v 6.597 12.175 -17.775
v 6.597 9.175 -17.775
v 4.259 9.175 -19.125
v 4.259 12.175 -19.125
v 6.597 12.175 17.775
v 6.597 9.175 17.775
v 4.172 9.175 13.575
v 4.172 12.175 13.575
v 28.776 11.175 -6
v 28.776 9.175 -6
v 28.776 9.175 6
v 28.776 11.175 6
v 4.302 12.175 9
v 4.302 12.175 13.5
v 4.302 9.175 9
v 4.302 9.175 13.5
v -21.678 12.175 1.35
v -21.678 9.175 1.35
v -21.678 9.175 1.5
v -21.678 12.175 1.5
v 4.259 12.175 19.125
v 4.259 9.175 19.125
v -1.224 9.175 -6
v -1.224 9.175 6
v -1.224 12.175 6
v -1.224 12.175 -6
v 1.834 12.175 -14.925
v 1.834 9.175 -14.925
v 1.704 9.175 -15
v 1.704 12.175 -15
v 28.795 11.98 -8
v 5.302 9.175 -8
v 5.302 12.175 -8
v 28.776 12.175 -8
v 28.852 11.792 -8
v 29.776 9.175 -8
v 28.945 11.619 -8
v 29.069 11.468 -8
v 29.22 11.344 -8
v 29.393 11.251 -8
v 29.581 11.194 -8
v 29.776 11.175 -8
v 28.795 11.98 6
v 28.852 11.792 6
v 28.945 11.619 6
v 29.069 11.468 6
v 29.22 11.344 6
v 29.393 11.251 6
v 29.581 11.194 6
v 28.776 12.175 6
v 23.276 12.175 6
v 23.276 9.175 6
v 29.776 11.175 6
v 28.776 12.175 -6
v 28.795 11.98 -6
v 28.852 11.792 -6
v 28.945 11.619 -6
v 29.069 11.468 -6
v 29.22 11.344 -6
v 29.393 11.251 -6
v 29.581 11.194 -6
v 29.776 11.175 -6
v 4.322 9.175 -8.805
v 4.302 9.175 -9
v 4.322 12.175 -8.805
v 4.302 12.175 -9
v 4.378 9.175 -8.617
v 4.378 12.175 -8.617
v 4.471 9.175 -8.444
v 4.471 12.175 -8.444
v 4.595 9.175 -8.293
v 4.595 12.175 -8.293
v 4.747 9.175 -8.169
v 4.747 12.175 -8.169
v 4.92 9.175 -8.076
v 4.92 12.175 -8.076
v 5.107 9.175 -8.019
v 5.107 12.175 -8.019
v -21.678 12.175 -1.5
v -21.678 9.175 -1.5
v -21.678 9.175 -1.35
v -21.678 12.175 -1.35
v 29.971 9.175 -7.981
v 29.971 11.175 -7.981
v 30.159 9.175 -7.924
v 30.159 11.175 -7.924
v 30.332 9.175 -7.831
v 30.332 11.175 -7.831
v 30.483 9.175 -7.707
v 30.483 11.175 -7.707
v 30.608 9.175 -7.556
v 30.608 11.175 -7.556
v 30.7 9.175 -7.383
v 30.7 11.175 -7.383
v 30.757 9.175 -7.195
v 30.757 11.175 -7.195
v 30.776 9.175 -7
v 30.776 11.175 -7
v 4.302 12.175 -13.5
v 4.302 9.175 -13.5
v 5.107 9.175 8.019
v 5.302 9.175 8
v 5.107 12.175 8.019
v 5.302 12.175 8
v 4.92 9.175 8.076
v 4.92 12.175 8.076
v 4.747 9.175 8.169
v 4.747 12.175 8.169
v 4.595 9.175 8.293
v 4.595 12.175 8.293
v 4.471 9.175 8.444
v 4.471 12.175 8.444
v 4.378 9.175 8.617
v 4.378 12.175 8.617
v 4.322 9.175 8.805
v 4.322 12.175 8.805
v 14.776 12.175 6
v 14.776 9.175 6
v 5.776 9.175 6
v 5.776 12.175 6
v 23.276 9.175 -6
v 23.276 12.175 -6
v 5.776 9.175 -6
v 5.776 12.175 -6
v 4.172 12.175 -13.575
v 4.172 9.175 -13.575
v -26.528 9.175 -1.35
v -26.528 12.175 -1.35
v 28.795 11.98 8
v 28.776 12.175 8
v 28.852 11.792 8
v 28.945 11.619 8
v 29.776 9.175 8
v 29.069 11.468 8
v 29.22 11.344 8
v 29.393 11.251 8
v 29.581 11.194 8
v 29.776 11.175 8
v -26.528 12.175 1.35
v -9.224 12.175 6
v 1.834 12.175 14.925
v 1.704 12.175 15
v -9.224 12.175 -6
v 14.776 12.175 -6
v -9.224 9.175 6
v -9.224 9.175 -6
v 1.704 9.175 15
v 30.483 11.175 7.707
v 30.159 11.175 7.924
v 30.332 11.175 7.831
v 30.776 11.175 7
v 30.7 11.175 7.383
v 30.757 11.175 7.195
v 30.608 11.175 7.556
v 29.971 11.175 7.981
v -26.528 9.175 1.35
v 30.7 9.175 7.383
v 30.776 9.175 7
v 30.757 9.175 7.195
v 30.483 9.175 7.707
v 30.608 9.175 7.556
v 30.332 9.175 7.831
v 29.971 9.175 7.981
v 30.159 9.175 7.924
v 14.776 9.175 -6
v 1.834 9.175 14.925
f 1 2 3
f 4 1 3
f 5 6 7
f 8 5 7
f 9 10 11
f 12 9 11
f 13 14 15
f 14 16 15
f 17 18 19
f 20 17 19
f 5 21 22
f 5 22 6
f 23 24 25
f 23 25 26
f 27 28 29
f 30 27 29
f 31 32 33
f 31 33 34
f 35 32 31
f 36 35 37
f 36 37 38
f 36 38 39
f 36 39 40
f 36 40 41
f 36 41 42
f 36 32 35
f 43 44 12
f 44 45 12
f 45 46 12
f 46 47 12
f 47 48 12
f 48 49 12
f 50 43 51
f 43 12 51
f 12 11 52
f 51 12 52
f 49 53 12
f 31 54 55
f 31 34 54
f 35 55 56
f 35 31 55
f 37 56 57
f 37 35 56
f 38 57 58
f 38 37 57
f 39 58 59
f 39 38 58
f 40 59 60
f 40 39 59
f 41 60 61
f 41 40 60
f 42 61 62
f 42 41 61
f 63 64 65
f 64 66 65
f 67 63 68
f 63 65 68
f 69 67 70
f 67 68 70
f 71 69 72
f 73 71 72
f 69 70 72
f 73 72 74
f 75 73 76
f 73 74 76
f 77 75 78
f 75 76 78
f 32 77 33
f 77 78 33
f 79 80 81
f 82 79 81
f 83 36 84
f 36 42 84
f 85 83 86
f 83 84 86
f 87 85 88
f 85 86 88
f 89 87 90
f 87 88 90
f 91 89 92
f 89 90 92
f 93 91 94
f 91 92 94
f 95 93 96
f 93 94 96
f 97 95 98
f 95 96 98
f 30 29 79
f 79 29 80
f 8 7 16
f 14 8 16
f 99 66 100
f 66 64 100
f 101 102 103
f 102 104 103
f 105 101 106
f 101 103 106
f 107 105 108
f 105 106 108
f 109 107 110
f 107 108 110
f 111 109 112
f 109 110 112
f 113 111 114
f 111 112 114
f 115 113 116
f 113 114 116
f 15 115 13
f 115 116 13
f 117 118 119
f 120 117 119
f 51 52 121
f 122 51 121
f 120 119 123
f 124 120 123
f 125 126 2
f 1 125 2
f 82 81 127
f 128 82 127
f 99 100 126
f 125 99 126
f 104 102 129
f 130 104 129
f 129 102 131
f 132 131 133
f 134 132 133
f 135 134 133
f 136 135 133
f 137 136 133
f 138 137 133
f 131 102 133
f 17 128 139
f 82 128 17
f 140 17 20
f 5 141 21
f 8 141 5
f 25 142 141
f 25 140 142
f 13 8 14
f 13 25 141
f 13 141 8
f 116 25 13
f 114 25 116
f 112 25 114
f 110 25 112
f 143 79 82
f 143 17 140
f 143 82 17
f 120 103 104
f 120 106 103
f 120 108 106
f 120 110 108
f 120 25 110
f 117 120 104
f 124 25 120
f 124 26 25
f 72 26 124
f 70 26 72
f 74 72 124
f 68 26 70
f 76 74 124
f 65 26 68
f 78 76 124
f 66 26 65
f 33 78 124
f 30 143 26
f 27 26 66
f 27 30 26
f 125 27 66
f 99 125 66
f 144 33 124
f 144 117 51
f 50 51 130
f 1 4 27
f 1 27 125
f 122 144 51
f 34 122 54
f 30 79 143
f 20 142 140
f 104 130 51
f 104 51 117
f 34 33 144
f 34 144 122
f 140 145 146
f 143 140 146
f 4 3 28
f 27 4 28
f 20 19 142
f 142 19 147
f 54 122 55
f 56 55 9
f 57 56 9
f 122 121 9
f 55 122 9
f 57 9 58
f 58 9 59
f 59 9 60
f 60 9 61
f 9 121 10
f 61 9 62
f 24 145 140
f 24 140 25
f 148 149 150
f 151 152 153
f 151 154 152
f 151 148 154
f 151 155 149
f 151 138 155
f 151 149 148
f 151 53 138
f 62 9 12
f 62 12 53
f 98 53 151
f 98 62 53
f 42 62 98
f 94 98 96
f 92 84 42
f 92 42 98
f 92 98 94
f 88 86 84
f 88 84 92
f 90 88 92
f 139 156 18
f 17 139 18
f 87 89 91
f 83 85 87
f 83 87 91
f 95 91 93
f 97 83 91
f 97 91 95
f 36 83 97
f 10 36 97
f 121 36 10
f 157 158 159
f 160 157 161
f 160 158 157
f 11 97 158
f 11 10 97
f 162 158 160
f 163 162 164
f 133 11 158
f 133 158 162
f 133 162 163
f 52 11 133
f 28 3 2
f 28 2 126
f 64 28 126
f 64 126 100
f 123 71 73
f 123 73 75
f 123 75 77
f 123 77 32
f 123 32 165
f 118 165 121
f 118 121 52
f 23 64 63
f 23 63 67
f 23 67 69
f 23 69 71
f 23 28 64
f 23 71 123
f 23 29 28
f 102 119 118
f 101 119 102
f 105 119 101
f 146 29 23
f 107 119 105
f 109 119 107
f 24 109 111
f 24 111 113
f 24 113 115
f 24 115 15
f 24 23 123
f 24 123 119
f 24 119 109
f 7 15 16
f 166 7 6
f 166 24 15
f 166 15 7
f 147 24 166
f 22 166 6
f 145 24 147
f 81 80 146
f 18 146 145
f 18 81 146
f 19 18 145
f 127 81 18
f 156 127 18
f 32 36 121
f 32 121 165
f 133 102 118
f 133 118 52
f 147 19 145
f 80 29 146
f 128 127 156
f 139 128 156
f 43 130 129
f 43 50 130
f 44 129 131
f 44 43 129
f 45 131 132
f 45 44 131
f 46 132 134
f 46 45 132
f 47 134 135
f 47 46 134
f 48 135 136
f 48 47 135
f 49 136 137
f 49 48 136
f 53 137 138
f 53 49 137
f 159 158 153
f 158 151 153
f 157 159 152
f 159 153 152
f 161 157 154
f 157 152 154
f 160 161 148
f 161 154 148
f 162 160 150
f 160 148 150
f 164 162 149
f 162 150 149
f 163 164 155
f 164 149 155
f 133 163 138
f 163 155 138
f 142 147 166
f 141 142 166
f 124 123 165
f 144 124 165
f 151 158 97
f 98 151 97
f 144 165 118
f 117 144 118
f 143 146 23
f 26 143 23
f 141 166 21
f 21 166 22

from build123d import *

# Parameters (mm, degrees)
SKETCH2_R                   = 88.9
BOSS_EXTRUDE1_DEPTH         = 3.175
SKETCH4_W                   = 15
SKETCH4_H                   = 17
SKETCH4_W_2                 = 21.412198496
SKETCH4_H_2                 = 63.5
CUT_EXTRUDE2_DEPTH          = 126.763669734
CIRPATTERN1_COUNT           = 3
CUT_EXTRUDE3_DEPTH          = 126.763669734
SKETCH8_R                   = 94.275983059
SKETCH8_R_2                 = 86.655983059
CUT_EXTRUDE_THIN1_DEPTH     = 126.763669734
SKETCH9_R                   = 3.175
CUT_EXTRUDE4_DEPTH          = 123.591188203
CIRPATTERN2_COUNT           = 3
SKETCH11_R                  = 1.5875
CUT_EXTRUDE6_DEPTH          = 123.591188203
CIRPATTERN3_COUNT           = 2
CIRPATTERN3_ANGLE           = 120
CIRPATTERN3_COPY_1_SKETCH_R = 1.5875
CIRPATTERN3_COPY_1_DEPTH    = 123.591188203
SKETCH12_R                  = 1.5875
CUT_EXTRUDE7_DEPTH          = 123.591188203
CIRPATTERN4_COUNT           = 2
CIRPATTERN4_ANGLE           = 120
CUT_EXTRUDE8_DEPTH          = 150
FILLET1_R                   = 22.86
BOSS_EXTRUDE2_DEPTH         = 3
SKETCH16_R                  = 86.655983059
CUT_EXTRUDE10_DEPTH         = 123.591188203
SKETCH17_W                  = 3
SKETCH17_H                  = 3
BOSS_EXTRUDE3_DEPTH         = 2
SKETCH18_R                  = 21.678393759
BOSS_EXTRUDE4_DEPTH         = 3
BOSS_EXTRUDE5_DEPTH         = 3
CUT_EXTRUDE11_DEPTH         = 50.498580331
CUT_EXTRUDE11_DEPTH_BACK    = 50.498580331
SKETCH21_W                  = 88.192317665
SKETCH21_H                  = 6
SKETCH23_W                  = 3
SKETCH23_H                  = 3
BOSS_EXTRUDE6_DEPTH         = 3
BOSS_EXTRUDE7_DEPTH         = 3
SKETCH27_W                  = 19.64601661
SKETCH27_H                  = 60.043759506
CUT_EXTRUDE12_DEPTH         = 3
BOSS_EXTRUDE8_DEPTH         = 3
CUT_EXTRUDE13_DEPTH         = 34.081573483
CUT_EXTRUDE13_DEPTH_BACK    = 3
CUT_EXTRUDE14_DEPTH         = 10
SKETCH31_W                  = 8
SKETCH31_H                  = 12
SKETCH31_W_2                = 26.473720558
SKETCH31_H_2                = 16
BOSS_EXTRUDE9_DEPTH         = 3
SKETCH32_W                  = 38.250446416
SKETCH32_H                  = 3
CUT_EXTRUDE15_DEPTH         = 62.626362233
SKETCH34_W                  = 2
SKETCH34_H                  = 16
CUT_EXTRUDE16_DEPTH         = 1
FILLET2_R                   = 1


with BuildPart() as part:
    # Sketch2 → Boss-Extrude1 (new body)
    with BuildSketch(Plane(origin=(0, 0, 0), x_dir=(1, 0, 0), z_dir=(0, 1, 0))):
        with Locations(Location((0, 0, 0), (0, 0, 270))):
            Circle(SKETCH2_R)
    extrude(amount=BOSS_EXTRUDE1_DEPTH)

    # Sketch4 → Cut-Extrude2 (cut, through all)
    with BuildSketch(Plane(origin=(0, 3.175, 0), x_dir=(1, 0, 0), z_dir=(0, 1, 0))):
        Polygon((23.51, 15.5), (16.51, 15.5), (16.51, -15.5), (23.51, -15.5), (23.51, -8.5), (23.51, 8.5), align=None)
        with Locations((73.13, 0)):
            Rectangle(SKETCH4_W, SKETCH4_H)
        with Locations((31.01, 0)):
            Rectangle(SKETCH4_W, SKETCH4_H)
        with Locations((91.336099248, 0)):
            Rectangle(SKETCH4_W_2, SKETCH4_H_2)
    cut_extrude2 = extrude(amount=-CUT_EXTRUDE2_DEPTH, mode=Mode.SUBTRACT)

    # CirPattern1: Cut-Extrude2 ×3 about axis
    cirpattern1_axis = Axis((0, 0, 0), (0, 1, 0))
    for i in range(1, CIRPATTERN1_COUNT):
        add(cut_extrude2.rotate(cirpattern1_axis, i * 360 / CIRPATTERN1_COUNT), mode=Mode.SUBTRACT)

    # Sketch6 → Cut-Extrude3 (cut, through all)
    with BuildSketch(Plane(origin=(0, 3.175, 0), x_dir=(1, 0, 0), z_dir=(0, 1, 0))):
        Polygon((-21.678393759, -6.548079416), (-21.678393759, 6.548079416), (5.168393759, 22.048079416), (16.51, 15.5), (16.51, -15.5), (5.168393759, -22.048079416), align=None)
    extrude(amount=-CUT_EXTRUDE3_DEPTH, mode=Mode.SUBTRACT)

    # Sketch8 → Cut-Extrude-Thin1 (cut, through all)
    with BuildSketch(Plane(origin=(0, 3.175, 0), x_dir=(1, 0, 0), z_dir=(0, 1, 0))):
        Circle(SKETCH8_R)
        Circle(SKETCH8_R_2, mode=Mode.SUBTRACT)
    extrude(amount=-CUT_EXTRUDE_THIN1_DEPTH, mode=Mode.SUBTRACT)

    # Sketch9 → Cut-Extrude4 (cut, through all)
    with BuildSketch(Plane(origin=(0, 3.175, 0), x_dir=(1, 0, 0), z_dir=(0, 1, 0))):
        with Locations(Location((65.549718535, 24.13, 0), (0, 0, 270))):
            Circle(SKETCH9_R)
        with Locations(Location((65.549718535, -24.13, 0), (0, 0, 90))):
            Circle(SKETCH9_R)
    cut_extrude4 = extrude(amount=-CUT_EXTRUDE4_DEPTH, mode=Mode.SUBTRACT)

    # CirPattern2: Cut-Extrude4 ×3 about axis
    cirpattern2_axis = Axis((0, 0, 0), (0, 1, 0))
    for i in range(1, CIRPATTERN2_COUNT):
        add(cut_extrude4.rotate(cirpattern2_axis, i * 360 / CIRPATTERN2_COUNT), mode=Mode.SUBTRACT)

    # Sketch11 → Cut-Extrude6 (cut, through all)
    with BuildSketch(Plane(origin=(0, 3.175, 0), x_dir=(1, 0, 0), z_dir=(0, 1, 0))):
        with Locations(Location((-74.764393759, 36.83, 0), (0, 0, 270))):
            Circle(SKETCH11_R)
        with Locations(Location((-62.064393759, 36.83, 0), (0, 0, 270))):
            Circle(SKETCH11_R)
        with Locations(Location((-74.764393759, 24.13, 0), (0, 0, 270))):
            Circle(SKETCH11_R)
    cut_extrude6 = extrude(amount=-CUT_EXTRUDE6_DEPTH, mode=Mode.SUBTRACT)

    # Mirror1: Cut-Extrude6 across plane
    add(cut_extrude6.mirror(Plane.XY), mode=Mode.SUBTRACT)

    # CirPattern3: Cut-Extrude6 ×2 about axis
    cirpattern3_axis = Axis((0, 0, 0), (0, 1, 0))
    for i in range(1, CIRPATTERN3_COUNT):
        add(cut_extrude6.rotate(cirpattern3_axis, i * CIRPATTERN3_ANGLE / (CIRPATTERN3_COUNT - 1)), mode=Mode.SUBTRACT)

    # CirPattern3 copy 1 sketch → CirPattern3 copy 1 (cut, through all)
    with BuildSketch(Plane(origin=(0, 3.175, 0), x_dir=(-0.5000000000000044, 0, -0.866025403784436), z_dir=(0, 1, 0))):
        with Locations((-74.764393759, -36.83)):
            Circle(CIRPATTERN3_COPY_1_SKETCH_R)
        with Locations((-62.064393759, -36.83)):
            Circle(CIRPATTERN3_COPY_1_SKETCH_R)
        with Locations((-74.764393759, -24.13)):
            Circle(CIRPATTERN3_COPY_1_SKETCH_R)
    extrude(amount=-CIRPATTERN3_COPY_1_DEPTH, mode=Mode.SUBTRACT)

    # Sketch12 → Cut-Extrude7 (cut, through all)
    with BuildSketch(Plane(origin=(0, 3.175, 0), x_dir=(1, 0, 0), z_dir=(0, 1, 0))):
        with Locations(Location((-33.108393759, 0, 0), (0, 0, 270))):
            Circle(SKETCH12_R)
        with BuildLine():
            ThreePointArc((-25.488393759, 5.3975), (-27.075893759, 3.81), (-25.488393759, 2.2225))
            Line((-25.488393759, 2.2225), (-25.488393759, 5.3975))
        make_face()
        with BuildLine():
            Line((-25.488393759, 5.3975), (-25.488393759, 2.2225))
            ThreePointArc((-25.488393759, 2.2225), (-24.365861744, 2.687467985), (-23.900893759, 3.81))
            ThreePointArc((-23.900893759, 3.81), (-24.365861744, 4.932532015), (-25.488393759, 5.3975))
        make_face()
        with BuildLine():
            ThreePointArc((-25.488393759, -2.2225), (-27.075893759, -3.81), (-25.488393759, -5.3975))
            Line((-25.488393759, -5.3975), (-25.488393759, -2.2225))
        make_face()
        with BuildLine():
            Line((-25.488393759, -2.2225), (-25.488393759, -5.3975))
            ThreePointArc((-25.488393759, -5.3975), (-24.365861744, -4.932532015), (-23.900893759, -3.81))
            ThreePointArc((-23.900893759, -3.81), (-24.365861744, -2.687467985), (-25.488393759, -2.2225))
        make_face()
    cut_extrude7 = extrude(amount=-CUT_EXTRUDE7_DEPTH, mode=Mode.SUBTRACT)

    # CirPattern4: Cut-Extrude7 ×2 about axis
    cirpattern4_axis = Axis((0, 0, 0), (0, 1, 0))
    for i in range(1, CIRPATTERN4_COUNT):
        add(cut_extrude7.rotate(cirpattern4_axis, i * CIRPATTERN4_ANGLE / (CIRPATTERN4_COUNT - 1)), mode=Mode.SUBTRACT)

    # Sketch10 → Cut-Extrude8 (cut)
    with BuildSketch(Plane(origin=(0, 3.175, 0), x_dir=(1, 0, 0), z_dir=(0, 1, 0))):
        Polygon((49.845863359, 15.215567884), (75.245863359, 59.209658396), (13.654136641, 94.769658396), (-11.745863359, 50.775567884), align=None)
    extrude(amount=-CUT_EXTRUDE8_DEPTH, mode=Mode.SUBTRACT)

    # Fillet1
    fillet1_edges = [part.edges().sort_by_distance(p)[0] for p in [
        (49.845863359, 1.5875, -15.215567884),
        (-11.745863359, 1.5875, -50.775567884),
    ]]
    fillet(fillet1_edges, radius=FILLET1_R)

    # Sketch16 → Cut-Extrude10 (cut, through all)
    with BuildSketch(Plane(origin=(0, 3.175, 0), x_dir=(1, 0, 0), z_dir=(0, 1, 0))):
        Circle(SKETCH16_R)
        Polygon((-21.678393759, -6.548079416), (5.168393759, -22.048079416), (16.51, -15.5), (16.51, 15.5), (5.168393759, 22.048079416), (-21.678393759, 6.548079416), align=None, mode=Mode.SUBTRACT)
    extrude(amount=-CUT_EXTRUDE10_DEPTH, mode=Mode.SUBTRACT)


with BuildPart() as body_2:
    # Sketch15 → Boss-Extrude2 (new body)
    with BuildSketch(Plane(origin=(0, 3.175, 0), x_dir=(1, 0, 0), z_dir=(0, 1, 0))):
        Polygon((5.168393759, -22.048079416), (16.51, -15.5), (16.51, 15.5), (5.168393759, 22.048079416), (-21.678393759, 6.548079416), (-21.678393759, -6.548079416), align=None)
    extrude(amount=BOSS_EXTRUDE2_DEPTH)

    # Sketch17 → Boss-Extrude3 (add)
    with BuildSketch(Plane.ZY.offset(21.678393759)):
        with Locations((0, 4.675)):
            Rectangle(SKETCH17_W, SKETCH17_H)
    extrude(amount=BOSS_EXTRUDE3_DEPTH)

    # Sketch18 → Boss-Extrude4 (add)
    with BuildSketch(Plane(origin=(0, 6.175, 0), x_dir=(1, 0, 0), z_dir=(0, 1, 0))):
        Circle(SKETCH18_R)
    extrude(amount=-BOSS_EXTRUDE4_DEPTH)

    # Sketch20 → Boss-Extrude5 (add)
    # profile 1 of 3: a face of its own
    with BuildSketch(Plane(origin=(0, 6.175, 0), x_dir=(1, 0, 0), z_dir=(0, 1, 0))):
        Polygon((12.138234985, -18.024039708), (12.138234985, 18.024039708), (9.540158774, 19.524039708), (-21.678393759, 1.5), (-23.678393759, 1.5), (-23.678393759, -1.5), (-21.678393759, -1.5), (9.540158774, -19.524039708), align=None)
        Polygon((9.138234985, -1.732050808), (9.138234985, -15.827887286), (-3.069117493, -8.779969047), align=None, mode=Mode.SUBTRACT)
        Polygon((-6.069117493, -7.047918239), (-18.27646997, 0), (-6.069117493, 7.047918239), align=None, mode=Mode.SUBTRACT)
        Polygon((-3.069117493, 5.315867431), (6.138234985, 0), (-3.069117493, -5.315867431), align=None, mode=Mode.SUBTRACT)
        Polygon((-3.069117493, 8.779969047), (9.138234985, 15.827887286), (9.138234985, 1.732050808), align=None, mode=Mode.SUBTRACT)
    # profile 2 of 3: a face of its own
    with BuildSketch(Plane(origin=(0, 6.175, 0), x_dir=(1, 0, 0), z_dir=(0, 1, 0))):
        Polygon((13.138234985, -19.756090516), (12.138234985, -18.024039708), (9.540158774, -19.524039708), (10.540158774, -21.256090516), align=None)
    # profile 3 of 3: a face of its own
    with BuildSketch(Plane(origin=(0, 6.175, 0), x_dir=(1, 0, 0), z_dir=(0, 1, 0))):
        Polygon((9.540158774, 19.524039708), (12.138234985, 18.024039708), (13.138234985, 19.756090516), (10.540158774, 21.256090516), align=None)
    extrude(amount=BOSS_EXTRUDE5_DEPTH)

    # Sketch21 → Cut-Extrude11 (cut, two sides: drawn at the far end of the back side and taken through both)
    with BuildSketch(Plane.ZY.offset(21.678393759).offset(-CUT_EXTRUDE11_DEPTH_BACK)):
        with Locations((-22.048079416, 3.175)):
            Rectangle(SKETCH21_W, SKETCH21_H)
    extrude(amount=CUT_EXTRUDE11_DEPTH + CUT_EXTRUDE11_DEPTH_BACK, mode=Mode.SUBTRACT)

    # Sketch23 → Boss-Extrude6 (add, through all)
    with BuildSketch(Plane(origin=(0, 9.175, 0), x_dir=(1, 0, 0), z_dir=(0, 1, 0))):
        Polygon((13.138234985, 19.756090516), (10.540158774, 21.256090516), (12.040158774, 23.854166727), (14.638234985, 22.354166727), align=None)
        with Locations((-25.178393759, 0)):
            Rectangle(SKETCH23_W, SKETCH23_H)
        Polygon((10.540158774, -21.256090516), (13.138234985, -19.756090516), (14.638234985, -22.354166727), (12.040158774, -23.854166727), align=None)
    extrude(amount=-BOSS_EXTRUDE6_DEPTH)

    # Sketch25 → Boss-Extrude7 (add)
    with BuildSketch(Plane(origin=(0, 9.175, 0), x_dir=(1, 0, 0), z_dir=(0, 1, 0))):
        Polygon((-21.678393759, -1.5), (9.540158774, -19.524039708), (12.040158774, -23.854166727), (14.638234985, -22.354166727), (12.138234985, -18.024039708), (12.138234985, 18.024039708), (14.638234985, 22.354166727), (12.040158774, 23.854166727), (9.540158774, 19.524039708), (-21.678393759, 1.5), (-26.678393759, 1.5), (-26.678393759, -1.5), align=None)
    extrude(amount=-BOSS_EXTRUDE7_DEPTH)

    # Sketch27 → Cut-Extrude12 (cut)
    with BuildSketch(Plane(origin=(0, 9.175, 0), x_dir=(1, 0, 0), z_dir=(0, 1, 0))):
        with Locations((11.527300449, -3.453437088)):
            Rectangle(SKETCH27_W, SKETCH27_H)
    extrude(amount=-CUT_EXTRUDE12_DEPTH, mode=Mode.SUBTRACT)

    # Sketch26 → Boss-Extrude8 (add)
    with BuildSketch(Plane(origin=(0, 9.175, 0), x_dir=(1, 0, 0), z_dir=(0, 1, 0))):
        Polygon((1.704292144, 15), (-21.678393759, 1.5), (-26.678393759, 1.5), (-26.678393759, -1.5), (-21.678393759, -1.5), (1.704292144, -15), (6.704292144, -17.886751346), (6.802368355, -17.830127019), (4.302368355, -13.5), (4.302368355, 13.5), (6.802368355, 17.830127019), (6.704292144, 17.886751346), align=None)
        Polygon((4.204292144, 19.330127019), (1.704292144, 15), (6.704292144, 17.886751346), align=None)
        Polygon((6.704292144, -17.886751346), (1.704292144, -15), (4.204292144, -19.330127019), align=None)
    extrude(amount=-BOSS_EXTRUDE8_DEPTH)

    # Sketch28 → Cut-Extrude13 (cut, two sides: drawn at the far end of the back side and taken through both)
    with BuildSketch(Plane(origin=(0, 9.175, 0), x_dir=(1, 0, 0), z_dir=(0, 1, 0)).offset(-CUT_EXTRUDE13_DEPTH_BACK)):
        Polygon((-9.987050808, 4.785898385), (-18.27646997, 0), (-9.987050808, 0), align=None)
        Polygon((-9.987050808, 0), (-18.27646997, 0), (-9.987050808, -4.785898385), align=None)
        Polygon((-6.987050808, -6.517949192), (1.302368355, -11.303847577), (1.302368355, -1.732050808), align=None)
        Polygon((1.302368355, 1.732050808), (1.302368355, 11.303847577), (-6.987050808, 6.517949192), align=None)
    extrude(amount=CUT_EXTRUDE13_DEPTH + CUT_EXTRUDE13_DEPTH_BACK, mode=Mode.SUBTRACT)

    # Sketch29 → Cut-Extrude14 (cut)
    with BuildSketch(Plane(origin=(0, 9.175, 0), x_dir=(1, 0, 0), z_dir=(0, 1, 0))):
        Polygon((4.302368355, 13.5), (6.802368355, 17.830127019), (4.204292144, 19.330127019), (1.704292144, 15), (1.834195954, 14.925), (4.259195954, 19.125223208), (6.597464544, 17.775223208), (4.172464544, 13.575), align=None)
        Polygon((-21.678393759, 1.35), (-21.678393759, 1.5), (-26.678393759, 1.5), (-26.678393759, -1.5), (-21.678393759, -1.5), (-21.678393759, -1.35), (-26.528393759, -1.35), (-26.528393759, 1.35), align=None)
        Polygon((1.704292144, -15), (4.204292144, -19.330127019), (6.802368355, -17.830127019), (4.302368355, -13.5), (4.172464544, -13.575), (6.597464544, -17.775223208), (4.259195954, -19.125223208), (1.834195954, -14.925), align=None)
    extrude(amount=-CUT_EXTRUDE14_DEPTH, mode=Mode.SUBTRACT)

    # Sketch31 → Boss-Extrude9 (add)
    # profile 1 of 2: a face of its own
    with BuildSketch(Plane(origin=(0, 9.175, 0), x_dir=(1, 0, 0), z_dir=(0, 1, 0))):
        Polygon((4.302368355, -8), (4.302368355, 8), (4.302368355, 13.5), (4.172464544, 13.575), (6.597464544, 17.775223208), (4.259195954, 19.125223208), (1.834195954, 14.925), (1.704292144, 15), (-21.678393759, 1.5), (-21.678393759, 1.35), (-26.528393759, 1.35), (-26.528393759, -1.35), (-21.678393759, -1.35), (-21.678393759, -1.5), (1.704292144, -15), (1.834195954, -14.925), (4.259195954, -19.125223208), (6.597464544, -17.775223208), (4.172464544, -13.575), (4.302368355, -13.5), align=None)
        with Locations((-5.223911087, 0)):
            Rectangle(SKETCH31_W, SKETCH31_H, mode=Mode.SUBTRACT)
    # profile 2 of 2: a face of its own
    with BuildSketch(Plane(origin=(0, 9.175, 0), x_dir=(1, 0, 0), z_dir=(0, 1, 0))):
        with Locations((17.539228634, 0)):
            Rectangle(SKETCH31_W_2, SKETCH31_H_2)
        Polygon((5.776088913, -6), (5.776088913, -5), (5.776088913, 5), (5.776088913, 6), (14.776088913, 6), (14.776088913, 5), (14.776088913, -5), (14.776088913, -6), align=None, mode=Mode.SUBTRACT)
        Polygon((28.776088913, -6), (23.276088913, -6), (23.276088913, -5), (23.276088913, 5), (23.276088913, 6), (28.776088913, 6), (28.776088913, 5), (28.776088913, -5), align=None, mode=Mode.SUBTRACT)
    extrude(amount=BOSS_EXTRUDE9_DEPTH)

    # Sketch32 → Cut-Extrude15 (cut, through all)
    with BuildSketch(Plane.ZY.offset(26.528393759)):
        with Locations((0, 7.675)):
            Rectangle(SKETCH32_W, SKETCH32_H)
    extrude(amount=-CUT_EXTRUDE15_DEPTH, mode=Mode.SUBTRACT)

    # Sketch34 → Cut-Extrude16 (cut)
    with BuildSketch(Plane(origin=(0, 12.175, 0), x_dir=(1, 0, 0), z_dir=(0, 1, 0))):
        with Locations((29.776088913, 0)):
            Rectangle(SKETCH34_W, SKETCH34_H)
    extrude(amount=-CUT_EXTRUDE16_DEPTH, mode=Mode.SUBTRACT)

    # Fillet2
    fillet2_edges = [body_2.edges().sort_by_distance(p)[0] for p in [
        (4.302368355, 10.675, -8),
        (4.302368355, 10.675, 8),
        (30.776088913, 10.175, -8),
        (28.776088913, 11.175, -7),
        (30.776088913, 10.175, 8),
        (28.776088913, 11.175, 7),
    ]]
    fillet(fillet2_edges, radius=FILLET2_R - 0.0001)  # a hair under: the kernel refuses the full size


solid = body_2.part
